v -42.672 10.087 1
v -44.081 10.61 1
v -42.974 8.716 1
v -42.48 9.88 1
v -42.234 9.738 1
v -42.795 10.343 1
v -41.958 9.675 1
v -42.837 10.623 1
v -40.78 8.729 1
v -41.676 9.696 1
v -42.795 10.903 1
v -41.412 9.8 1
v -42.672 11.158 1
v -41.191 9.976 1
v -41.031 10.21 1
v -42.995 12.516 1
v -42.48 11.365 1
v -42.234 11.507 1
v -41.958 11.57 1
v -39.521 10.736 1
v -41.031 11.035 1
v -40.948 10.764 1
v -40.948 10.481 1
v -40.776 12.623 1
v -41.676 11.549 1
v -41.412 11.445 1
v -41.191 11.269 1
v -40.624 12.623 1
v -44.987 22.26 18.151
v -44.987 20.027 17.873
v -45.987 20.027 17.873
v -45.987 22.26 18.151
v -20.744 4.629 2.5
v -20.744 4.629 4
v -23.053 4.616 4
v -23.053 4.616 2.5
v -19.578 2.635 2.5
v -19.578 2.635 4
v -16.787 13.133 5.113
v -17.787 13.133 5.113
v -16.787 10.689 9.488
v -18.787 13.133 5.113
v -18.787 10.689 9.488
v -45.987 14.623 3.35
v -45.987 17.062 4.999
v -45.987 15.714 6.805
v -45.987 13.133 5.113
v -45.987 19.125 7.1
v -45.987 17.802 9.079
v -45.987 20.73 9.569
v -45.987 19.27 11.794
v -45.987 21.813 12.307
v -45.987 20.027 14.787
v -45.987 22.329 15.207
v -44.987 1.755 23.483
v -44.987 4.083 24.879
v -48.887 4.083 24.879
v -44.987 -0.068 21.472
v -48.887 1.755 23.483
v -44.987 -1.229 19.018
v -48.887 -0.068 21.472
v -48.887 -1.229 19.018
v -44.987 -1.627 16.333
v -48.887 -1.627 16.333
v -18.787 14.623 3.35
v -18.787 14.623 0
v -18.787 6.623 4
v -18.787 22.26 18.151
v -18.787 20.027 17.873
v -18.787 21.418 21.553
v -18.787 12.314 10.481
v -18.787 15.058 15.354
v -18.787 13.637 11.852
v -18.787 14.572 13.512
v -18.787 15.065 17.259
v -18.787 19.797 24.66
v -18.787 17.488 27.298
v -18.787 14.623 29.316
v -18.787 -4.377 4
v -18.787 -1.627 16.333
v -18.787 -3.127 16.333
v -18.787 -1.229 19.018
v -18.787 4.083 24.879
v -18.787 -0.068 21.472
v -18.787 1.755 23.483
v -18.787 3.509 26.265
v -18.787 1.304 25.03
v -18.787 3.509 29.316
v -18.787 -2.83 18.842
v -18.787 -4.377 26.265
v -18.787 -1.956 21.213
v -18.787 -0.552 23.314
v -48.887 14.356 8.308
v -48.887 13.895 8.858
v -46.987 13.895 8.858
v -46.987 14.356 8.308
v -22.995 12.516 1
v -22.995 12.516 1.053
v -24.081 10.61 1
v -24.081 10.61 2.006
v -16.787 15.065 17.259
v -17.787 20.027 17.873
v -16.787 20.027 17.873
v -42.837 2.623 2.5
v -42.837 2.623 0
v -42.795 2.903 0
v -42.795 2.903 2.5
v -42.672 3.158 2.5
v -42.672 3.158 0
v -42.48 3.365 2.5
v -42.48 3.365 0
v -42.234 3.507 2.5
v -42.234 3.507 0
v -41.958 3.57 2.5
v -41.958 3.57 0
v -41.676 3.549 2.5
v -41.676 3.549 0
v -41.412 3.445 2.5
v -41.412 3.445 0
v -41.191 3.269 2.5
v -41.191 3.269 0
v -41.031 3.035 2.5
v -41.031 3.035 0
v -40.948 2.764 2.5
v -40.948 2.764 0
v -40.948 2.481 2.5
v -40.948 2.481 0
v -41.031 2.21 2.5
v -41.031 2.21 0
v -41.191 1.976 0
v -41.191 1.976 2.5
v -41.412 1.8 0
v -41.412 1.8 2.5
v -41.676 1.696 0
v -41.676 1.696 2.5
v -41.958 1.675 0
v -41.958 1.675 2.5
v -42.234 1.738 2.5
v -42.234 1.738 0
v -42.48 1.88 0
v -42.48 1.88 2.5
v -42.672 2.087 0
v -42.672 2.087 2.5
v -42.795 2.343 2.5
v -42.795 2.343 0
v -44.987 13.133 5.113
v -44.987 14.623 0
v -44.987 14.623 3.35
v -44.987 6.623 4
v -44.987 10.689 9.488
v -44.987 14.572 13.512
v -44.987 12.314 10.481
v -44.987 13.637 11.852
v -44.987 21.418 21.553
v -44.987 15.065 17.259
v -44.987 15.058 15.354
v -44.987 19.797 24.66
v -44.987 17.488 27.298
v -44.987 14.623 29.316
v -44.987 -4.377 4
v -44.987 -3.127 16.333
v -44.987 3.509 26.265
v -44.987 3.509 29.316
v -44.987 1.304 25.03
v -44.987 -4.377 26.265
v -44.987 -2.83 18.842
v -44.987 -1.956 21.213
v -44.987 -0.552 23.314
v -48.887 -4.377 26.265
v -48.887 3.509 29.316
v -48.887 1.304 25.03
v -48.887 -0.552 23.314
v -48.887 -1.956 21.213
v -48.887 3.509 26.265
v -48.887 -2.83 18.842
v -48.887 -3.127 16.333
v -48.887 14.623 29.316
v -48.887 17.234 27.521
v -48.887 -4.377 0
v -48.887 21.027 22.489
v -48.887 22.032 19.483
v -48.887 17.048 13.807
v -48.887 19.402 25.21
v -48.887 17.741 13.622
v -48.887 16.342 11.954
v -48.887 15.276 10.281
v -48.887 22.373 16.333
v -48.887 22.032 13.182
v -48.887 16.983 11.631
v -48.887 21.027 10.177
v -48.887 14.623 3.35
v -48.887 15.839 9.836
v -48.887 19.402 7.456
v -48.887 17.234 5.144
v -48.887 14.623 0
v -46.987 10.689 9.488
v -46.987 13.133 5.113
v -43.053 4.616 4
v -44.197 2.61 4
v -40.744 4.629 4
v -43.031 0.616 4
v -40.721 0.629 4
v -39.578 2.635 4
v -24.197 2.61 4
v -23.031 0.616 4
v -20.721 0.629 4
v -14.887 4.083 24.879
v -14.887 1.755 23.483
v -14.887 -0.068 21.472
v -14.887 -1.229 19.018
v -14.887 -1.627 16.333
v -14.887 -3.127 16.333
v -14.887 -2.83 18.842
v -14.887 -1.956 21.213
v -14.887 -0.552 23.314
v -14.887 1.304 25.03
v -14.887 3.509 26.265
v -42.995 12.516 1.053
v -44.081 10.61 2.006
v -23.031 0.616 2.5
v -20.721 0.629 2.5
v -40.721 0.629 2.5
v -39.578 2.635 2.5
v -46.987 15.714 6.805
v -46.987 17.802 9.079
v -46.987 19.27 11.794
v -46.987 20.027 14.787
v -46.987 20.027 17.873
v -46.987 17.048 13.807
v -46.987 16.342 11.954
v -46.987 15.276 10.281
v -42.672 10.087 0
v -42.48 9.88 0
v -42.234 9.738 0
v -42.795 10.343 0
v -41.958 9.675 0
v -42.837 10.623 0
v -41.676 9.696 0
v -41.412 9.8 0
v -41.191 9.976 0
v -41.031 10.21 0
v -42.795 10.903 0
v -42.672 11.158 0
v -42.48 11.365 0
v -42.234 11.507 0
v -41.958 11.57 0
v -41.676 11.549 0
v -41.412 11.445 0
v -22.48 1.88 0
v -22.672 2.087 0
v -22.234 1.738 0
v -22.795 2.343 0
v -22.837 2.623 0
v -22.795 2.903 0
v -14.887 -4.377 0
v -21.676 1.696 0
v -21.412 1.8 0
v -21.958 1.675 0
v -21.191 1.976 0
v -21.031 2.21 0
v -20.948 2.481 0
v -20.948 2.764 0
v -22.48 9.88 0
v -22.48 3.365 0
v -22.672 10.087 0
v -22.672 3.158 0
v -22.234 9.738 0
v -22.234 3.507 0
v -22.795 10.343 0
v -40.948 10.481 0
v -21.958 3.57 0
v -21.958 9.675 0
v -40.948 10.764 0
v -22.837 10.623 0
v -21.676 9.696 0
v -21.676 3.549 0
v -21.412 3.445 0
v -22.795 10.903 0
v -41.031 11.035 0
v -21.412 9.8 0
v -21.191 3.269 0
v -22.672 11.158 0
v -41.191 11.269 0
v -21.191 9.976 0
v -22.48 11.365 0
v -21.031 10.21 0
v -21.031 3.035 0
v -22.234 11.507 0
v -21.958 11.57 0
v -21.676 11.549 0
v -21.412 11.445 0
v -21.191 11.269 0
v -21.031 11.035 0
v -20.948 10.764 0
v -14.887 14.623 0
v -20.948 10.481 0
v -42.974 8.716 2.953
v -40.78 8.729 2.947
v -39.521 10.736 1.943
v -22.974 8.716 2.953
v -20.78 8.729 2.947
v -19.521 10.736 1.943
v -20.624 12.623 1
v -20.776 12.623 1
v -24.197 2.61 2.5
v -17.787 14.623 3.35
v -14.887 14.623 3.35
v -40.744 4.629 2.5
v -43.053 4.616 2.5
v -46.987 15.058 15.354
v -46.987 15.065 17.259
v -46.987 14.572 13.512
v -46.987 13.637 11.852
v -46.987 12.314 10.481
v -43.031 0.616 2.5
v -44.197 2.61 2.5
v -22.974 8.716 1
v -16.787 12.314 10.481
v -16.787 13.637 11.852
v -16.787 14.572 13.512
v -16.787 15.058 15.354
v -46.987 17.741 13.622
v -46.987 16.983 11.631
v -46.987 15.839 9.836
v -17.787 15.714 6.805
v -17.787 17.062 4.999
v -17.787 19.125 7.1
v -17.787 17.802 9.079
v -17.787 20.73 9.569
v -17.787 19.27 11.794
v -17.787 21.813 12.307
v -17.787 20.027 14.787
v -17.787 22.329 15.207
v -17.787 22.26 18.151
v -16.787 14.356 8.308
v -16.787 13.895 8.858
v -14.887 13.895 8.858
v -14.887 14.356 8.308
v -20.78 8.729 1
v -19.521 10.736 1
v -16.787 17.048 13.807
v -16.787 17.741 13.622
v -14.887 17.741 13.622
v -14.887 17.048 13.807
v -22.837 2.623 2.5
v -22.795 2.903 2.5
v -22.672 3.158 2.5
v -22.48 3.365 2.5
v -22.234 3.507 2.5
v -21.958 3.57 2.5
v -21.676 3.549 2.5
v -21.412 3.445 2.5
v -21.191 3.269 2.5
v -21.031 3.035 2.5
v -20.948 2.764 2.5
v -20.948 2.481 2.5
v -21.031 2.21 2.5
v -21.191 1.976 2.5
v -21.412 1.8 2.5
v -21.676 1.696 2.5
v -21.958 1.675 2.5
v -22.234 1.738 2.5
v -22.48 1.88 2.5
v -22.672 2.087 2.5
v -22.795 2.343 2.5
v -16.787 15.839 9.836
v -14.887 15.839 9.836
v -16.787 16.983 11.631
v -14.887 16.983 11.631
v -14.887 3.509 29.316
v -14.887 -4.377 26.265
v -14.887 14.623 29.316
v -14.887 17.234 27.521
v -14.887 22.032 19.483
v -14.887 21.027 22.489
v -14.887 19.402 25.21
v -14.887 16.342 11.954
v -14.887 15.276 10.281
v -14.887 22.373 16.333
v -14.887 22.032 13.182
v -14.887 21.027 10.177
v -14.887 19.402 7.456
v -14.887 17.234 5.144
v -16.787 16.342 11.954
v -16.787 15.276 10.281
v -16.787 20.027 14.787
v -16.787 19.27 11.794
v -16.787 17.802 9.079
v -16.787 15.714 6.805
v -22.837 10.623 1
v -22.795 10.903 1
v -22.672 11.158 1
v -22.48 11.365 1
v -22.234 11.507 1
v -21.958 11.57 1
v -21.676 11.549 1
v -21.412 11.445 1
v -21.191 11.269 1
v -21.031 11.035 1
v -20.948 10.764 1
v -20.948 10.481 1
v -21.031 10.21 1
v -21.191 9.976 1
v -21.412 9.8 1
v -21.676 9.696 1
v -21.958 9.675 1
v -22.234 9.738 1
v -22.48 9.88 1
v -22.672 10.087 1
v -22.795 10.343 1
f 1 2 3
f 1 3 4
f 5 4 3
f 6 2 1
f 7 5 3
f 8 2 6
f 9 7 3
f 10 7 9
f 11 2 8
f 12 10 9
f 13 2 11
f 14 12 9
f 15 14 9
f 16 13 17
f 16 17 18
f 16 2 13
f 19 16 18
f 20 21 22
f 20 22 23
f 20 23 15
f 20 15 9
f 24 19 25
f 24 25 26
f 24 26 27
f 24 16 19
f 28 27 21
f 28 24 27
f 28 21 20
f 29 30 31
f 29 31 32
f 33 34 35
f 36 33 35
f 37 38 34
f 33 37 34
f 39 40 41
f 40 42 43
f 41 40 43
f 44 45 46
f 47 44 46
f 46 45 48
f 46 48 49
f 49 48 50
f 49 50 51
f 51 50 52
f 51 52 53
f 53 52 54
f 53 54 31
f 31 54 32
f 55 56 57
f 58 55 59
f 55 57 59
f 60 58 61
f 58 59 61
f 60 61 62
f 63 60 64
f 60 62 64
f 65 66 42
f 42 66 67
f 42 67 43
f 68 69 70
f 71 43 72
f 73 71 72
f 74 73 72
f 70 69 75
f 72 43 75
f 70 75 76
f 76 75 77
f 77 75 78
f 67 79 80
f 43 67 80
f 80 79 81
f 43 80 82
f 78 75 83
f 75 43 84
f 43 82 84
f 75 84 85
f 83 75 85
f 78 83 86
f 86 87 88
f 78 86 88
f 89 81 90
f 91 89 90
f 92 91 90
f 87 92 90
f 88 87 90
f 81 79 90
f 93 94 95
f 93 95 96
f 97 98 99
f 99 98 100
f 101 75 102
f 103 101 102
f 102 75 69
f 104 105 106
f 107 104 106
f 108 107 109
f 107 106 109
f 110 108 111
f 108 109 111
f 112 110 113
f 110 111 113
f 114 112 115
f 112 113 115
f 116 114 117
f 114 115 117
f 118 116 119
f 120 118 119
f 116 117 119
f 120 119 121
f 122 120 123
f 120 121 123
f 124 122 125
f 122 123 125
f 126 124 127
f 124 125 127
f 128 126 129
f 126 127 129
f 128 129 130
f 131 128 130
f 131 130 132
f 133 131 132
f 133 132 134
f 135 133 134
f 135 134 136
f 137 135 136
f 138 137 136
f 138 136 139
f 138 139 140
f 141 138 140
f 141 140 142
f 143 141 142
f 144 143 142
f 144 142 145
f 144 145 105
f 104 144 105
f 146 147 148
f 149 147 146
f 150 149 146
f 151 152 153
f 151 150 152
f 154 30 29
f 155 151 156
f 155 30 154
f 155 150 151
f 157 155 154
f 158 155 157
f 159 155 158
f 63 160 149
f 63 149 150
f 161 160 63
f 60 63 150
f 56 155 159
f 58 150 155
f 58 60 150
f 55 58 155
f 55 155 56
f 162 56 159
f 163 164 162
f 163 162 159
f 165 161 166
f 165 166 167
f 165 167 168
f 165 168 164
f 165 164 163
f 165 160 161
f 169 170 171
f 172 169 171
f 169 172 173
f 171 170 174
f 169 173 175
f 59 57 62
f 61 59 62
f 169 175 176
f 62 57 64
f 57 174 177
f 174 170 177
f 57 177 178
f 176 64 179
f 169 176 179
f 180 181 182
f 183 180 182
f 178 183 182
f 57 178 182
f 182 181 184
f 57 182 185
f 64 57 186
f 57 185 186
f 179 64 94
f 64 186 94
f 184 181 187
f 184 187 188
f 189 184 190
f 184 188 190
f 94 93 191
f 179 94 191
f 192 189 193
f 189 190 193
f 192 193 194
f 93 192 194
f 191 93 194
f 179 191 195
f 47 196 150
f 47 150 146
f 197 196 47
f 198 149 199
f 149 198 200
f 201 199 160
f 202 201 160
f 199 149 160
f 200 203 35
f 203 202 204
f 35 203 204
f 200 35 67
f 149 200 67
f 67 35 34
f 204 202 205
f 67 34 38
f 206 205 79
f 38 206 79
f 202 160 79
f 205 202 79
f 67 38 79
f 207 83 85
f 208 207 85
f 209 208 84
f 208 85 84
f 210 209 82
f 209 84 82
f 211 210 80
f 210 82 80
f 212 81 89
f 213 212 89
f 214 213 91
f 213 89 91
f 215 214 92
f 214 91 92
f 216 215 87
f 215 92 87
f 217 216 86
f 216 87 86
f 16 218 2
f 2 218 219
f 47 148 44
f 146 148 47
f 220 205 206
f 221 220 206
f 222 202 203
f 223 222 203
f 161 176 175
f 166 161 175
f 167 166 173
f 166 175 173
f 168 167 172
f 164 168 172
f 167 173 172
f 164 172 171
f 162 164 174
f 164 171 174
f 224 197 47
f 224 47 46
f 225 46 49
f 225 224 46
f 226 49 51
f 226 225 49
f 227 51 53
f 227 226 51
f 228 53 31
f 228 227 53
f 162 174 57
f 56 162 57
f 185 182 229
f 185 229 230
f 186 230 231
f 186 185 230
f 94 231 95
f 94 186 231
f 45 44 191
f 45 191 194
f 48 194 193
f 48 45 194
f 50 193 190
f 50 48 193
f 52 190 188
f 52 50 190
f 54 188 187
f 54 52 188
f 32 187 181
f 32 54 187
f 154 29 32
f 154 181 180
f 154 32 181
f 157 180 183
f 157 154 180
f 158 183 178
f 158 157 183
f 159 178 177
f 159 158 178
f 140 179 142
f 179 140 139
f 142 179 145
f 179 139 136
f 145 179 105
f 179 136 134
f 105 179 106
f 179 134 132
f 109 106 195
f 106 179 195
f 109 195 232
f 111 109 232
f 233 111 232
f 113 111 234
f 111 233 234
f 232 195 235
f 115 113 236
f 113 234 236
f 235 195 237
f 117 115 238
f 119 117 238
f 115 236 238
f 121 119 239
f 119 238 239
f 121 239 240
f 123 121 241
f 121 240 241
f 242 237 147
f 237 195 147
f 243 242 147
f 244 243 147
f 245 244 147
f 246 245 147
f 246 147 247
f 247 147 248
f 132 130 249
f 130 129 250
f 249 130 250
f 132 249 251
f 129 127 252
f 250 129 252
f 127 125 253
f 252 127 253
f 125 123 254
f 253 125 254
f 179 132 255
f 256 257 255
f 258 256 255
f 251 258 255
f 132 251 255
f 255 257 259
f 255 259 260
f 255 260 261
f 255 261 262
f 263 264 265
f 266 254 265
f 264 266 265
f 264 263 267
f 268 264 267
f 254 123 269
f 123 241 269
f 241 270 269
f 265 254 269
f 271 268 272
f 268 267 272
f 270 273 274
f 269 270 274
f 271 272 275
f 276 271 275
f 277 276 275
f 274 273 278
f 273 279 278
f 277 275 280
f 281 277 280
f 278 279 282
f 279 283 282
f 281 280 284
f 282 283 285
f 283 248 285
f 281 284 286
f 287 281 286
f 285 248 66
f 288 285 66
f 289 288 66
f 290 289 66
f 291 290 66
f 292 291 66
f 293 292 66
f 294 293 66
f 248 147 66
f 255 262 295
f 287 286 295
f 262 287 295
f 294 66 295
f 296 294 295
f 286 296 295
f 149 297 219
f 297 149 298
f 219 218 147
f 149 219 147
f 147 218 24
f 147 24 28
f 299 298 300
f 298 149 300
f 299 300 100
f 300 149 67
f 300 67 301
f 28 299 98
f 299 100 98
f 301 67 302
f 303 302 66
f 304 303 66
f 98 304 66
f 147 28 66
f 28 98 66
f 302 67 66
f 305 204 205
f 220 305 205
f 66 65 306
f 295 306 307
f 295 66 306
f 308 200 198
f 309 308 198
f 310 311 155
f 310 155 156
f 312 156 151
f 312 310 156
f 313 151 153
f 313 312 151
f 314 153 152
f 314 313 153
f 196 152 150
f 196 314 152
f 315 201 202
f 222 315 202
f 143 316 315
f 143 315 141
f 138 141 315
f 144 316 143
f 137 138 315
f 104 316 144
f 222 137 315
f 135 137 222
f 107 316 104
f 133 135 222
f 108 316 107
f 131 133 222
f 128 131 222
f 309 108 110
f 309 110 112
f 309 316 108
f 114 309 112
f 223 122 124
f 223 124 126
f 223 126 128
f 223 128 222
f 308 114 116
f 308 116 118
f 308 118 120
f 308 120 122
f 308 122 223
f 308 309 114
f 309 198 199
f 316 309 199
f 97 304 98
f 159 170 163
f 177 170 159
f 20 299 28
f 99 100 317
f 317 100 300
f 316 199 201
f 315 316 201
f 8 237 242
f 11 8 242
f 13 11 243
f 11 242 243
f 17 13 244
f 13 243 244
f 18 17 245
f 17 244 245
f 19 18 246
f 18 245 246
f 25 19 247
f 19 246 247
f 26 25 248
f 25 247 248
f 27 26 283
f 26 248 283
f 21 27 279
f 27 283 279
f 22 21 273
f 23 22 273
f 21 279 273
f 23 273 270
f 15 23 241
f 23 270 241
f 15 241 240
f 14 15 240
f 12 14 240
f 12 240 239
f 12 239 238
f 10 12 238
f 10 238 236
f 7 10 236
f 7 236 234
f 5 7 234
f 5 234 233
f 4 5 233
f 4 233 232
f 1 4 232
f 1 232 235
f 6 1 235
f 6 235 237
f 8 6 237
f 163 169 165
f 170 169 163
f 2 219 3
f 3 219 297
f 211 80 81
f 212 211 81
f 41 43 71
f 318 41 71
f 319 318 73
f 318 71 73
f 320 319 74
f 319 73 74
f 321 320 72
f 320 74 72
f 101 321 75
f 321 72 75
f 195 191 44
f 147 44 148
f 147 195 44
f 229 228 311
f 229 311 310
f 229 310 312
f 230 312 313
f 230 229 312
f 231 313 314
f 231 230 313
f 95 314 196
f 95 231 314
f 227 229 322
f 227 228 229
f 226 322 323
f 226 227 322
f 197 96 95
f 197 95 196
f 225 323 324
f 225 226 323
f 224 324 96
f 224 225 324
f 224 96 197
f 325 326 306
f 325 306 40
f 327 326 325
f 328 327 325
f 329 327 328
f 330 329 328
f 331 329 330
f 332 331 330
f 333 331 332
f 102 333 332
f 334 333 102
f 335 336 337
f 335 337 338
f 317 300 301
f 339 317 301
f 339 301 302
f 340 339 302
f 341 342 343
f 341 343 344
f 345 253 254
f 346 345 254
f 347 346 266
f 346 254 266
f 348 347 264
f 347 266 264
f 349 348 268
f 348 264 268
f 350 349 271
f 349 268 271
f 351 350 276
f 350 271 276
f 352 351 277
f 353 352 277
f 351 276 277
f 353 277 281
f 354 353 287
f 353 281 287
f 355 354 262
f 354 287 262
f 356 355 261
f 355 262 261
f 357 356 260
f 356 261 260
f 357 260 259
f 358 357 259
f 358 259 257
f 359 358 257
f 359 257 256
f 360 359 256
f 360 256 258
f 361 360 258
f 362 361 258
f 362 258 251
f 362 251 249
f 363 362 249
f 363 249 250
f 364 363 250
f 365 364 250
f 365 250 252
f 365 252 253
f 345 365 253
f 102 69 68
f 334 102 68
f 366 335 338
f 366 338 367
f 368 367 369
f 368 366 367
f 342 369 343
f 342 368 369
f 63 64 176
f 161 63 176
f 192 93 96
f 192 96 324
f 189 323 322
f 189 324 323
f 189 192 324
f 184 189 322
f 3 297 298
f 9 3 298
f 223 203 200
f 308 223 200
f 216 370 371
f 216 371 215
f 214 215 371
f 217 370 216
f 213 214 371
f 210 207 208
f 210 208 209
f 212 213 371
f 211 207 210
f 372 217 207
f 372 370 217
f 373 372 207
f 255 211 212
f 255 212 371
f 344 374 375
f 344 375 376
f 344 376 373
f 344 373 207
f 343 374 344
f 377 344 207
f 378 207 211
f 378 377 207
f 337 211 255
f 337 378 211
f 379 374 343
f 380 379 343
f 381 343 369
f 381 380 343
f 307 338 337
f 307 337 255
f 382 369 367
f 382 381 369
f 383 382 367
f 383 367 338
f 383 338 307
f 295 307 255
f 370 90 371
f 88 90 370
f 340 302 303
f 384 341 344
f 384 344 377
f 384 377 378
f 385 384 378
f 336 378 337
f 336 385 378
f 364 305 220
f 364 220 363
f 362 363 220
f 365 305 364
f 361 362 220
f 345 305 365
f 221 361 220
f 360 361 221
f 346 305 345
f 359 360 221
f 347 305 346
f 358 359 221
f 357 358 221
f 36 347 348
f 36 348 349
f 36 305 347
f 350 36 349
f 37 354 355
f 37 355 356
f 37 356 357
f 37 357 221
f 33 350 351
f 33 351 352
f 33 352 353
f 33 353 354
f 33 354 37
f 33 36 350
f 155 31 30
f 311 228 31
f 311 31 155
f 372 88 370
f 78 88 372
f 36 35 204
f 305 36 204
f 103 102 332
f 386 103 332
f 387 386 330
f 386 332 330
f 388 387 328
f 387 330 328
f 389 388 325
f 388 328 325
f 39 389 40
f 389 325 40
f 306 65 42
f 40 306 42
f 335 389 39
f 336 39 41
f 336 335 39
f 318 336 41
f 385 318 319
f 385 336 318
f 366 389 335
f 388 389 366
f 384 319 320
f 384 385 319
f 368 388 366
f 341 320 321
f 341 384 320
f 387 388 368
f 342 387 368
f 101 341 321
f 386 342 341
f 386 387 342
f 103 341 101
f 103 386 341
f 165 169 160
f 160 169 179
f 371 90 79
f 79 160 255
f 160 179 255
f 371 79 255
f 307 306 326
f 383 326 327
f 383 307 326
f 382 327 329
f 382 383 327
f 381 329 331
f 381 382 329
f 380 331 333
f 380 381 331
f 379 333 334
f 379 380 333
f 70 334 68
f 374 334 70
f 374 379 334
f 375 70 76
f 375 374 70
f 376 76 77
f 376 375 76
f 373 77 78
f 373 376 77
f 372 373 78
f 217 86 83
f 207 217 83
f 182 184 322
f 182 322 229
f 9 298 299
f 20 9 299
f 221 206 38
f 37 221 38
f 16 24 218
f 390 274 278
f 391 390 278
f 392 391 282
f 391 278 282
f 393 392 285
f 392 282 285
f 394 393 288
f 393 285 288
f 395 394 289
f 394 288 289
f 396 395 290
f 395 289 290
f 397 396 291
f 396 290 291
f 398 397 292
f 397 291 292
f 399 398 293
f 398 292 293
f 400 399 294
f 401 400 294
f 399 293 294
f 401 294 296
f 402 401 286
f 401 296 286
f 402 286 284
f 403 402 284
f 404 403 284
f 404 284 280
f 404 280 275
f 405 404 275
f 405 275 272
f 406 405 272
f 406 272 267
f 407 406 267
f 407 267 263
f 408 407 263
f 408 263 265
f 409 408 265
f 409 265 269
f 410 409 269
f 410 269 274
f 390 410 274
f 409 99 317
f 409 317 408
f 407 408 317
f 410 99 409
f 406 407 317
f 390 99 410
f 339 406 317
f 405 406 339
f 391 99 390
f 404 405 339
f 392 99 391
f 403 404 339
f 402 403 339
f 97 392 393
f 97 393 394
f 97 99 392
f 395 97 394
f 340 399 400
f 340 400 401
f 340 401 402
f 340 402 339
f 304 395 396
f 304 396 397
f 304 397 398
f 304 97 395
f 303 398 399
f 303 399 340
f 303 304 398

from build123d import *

# Parameters (mm, degrees)
CROQUIS1_W              = 34
CROQUIS1_H              = 19
SALIENTE_EXTRUIR1_DEPTH = 35
CROQUIS2_W              = 26.2
CROQUIS2_H              = 31
CORTAR_EXTRUIR1_DEPTH   = 25
CORTAR_EXTRUIR3_DEPTH   = 26.2
SALIENTE_EXTRUIR2_DEPTH = 34
CROQUIS10_W             = 26.2
CROQUIS10_H             = 25.966324345
CORTAR_EXTRUIR4_DEPTH   = 10
CORTAR_EXTRUIR5_START   = -34
CORTAR_EXTRUIR5_DEPTH   = 34
CORTAR_EXTRUIR6_DEPTH   = 2
CORTAR_EXTRUIR7_START   = 28.2
CORTAR_EXTRUIR7_DEPTH   = 28.2
CORTAR_EXTRUIR8_DEPTH   = 1
CORTAR_EXTRUIR9_DEPTH   = 27.2
CORTAR_EXTRUIR10_START  = -34
CORTAR_EXTRUIR10_DEPTH  = 34
CROQUIS18_R             = 0.95
CORTAR_EXTRUIR11_DEPTH  = 4
CORTAR_EXTRUIR12_DEPTH  = 1.5
CORTAR_EXTRUIR13_DEPTH  = 3


with BuildPart() as part:
    # Croquis1 → Saliente-Extruir1 (new body)
    with BuildSketch(Plane.XY):
        with Locations((-31.887263086, 5.12254902)):
            Rectangle(CROQUIS1_W, CROQUIS1_H)
    extrude(amount=SALIENTE_EXTRUIR1_DEPTH)

    # Croquis2 → Cortar-Extruir1 (cut)
    with BuildSketch(Plane.XZ.offset(4.37745098)):
        with Locations((-31.887263086, 19.5)):
            Rectangle(CROQUIS2_W, CROQUIS2_H)
    extrude(amount=-CORTAR_EXTRUIR1_DEPTH, mode=Mode.SUBTRACT)

    # Croquis4 → Cortar-Extruir3 (cut)
    with BuildSketch(Plane.ZY.offset(18.787263086)):
        Polygon((4, 14.62254902), (4, 6.62254902), (0, 14.62254902), align=None)
    extrude(amount=CORTAR_EXTRUIR3_DEPTH, mode=Mode.SUBTRACT)

    # Croquis9 → Saliente-Extruir2 (add)
    with BuildSketch(Plane(origin=(-14.887263086, 0, 0), x_dir=(0, 0, -1), z_dir=(1, 0, 0))):
        with BuildLine():
            Line((-29.315831827, 14.62254902), (-3.349507482, 14.62254902))
            ThreePointArc((-3.349507482, 14.62254902), (-16.332669655, 22.37254902), (-29.315831827, 14.62254902))
        make_face()
    extrude(amount=-SALIENTE_EXTRUIR2_DEPTH)

    # Croquis10 → Cortar-Extruir4 (cut)
    with BuildSketch(Plane.XZ.offset(-14.62254902)):
        with Locations((-31.887263086, 16.332669655)):
            Rectangle(CROQUIS10_W, CROQUIS10_H)
    extrude(amount=-CORTAR_EXTRUIR4_DEPTH, mode=Mode.SUBTRACT)

    # Croquis11 → Cortar-Extruir5 (cut)
    with BuildSketch(Plane(origin=(-14.887263086, 0, 0), x_dir=(0, 0, -1), z_dir=(1, 0, 0)).offset(CORTAR_EXTRUIR5_START)):
        with BuildLine():
            Line((-26.264575199, 3.509186373), (-24.878727914, 4.083143951))
            ThreePointArc((-24.878727914, 4.083143951), (-21.471881808, -0.068419609), (-16.332669655, -1.62745098))
            Line((-16.332669655, -1.62745098), (-16.332669655, -3.12745098))
            ThreePointArc((-16.332669655, -3.12745098), (-22.305267563, -1.31560371), (-26.264575199, 3.509186373))
        make_face()
        with BuildLine():
            Line((-13.621540157, 17.74062205), (-13.807242822, 17.04757027))
            ThreePointArc((-13.807242822, 17.04757027), (-11.089968726, 15.851941052), (-8.857991001, 13.894549121))
            Line((-8.857991001, 13.894549121), (-8.308354113, 14.355749231))
            ThreePointArc((-8.308354113, 14.355749231), (-10.704456257, 16.457074414), (-13.621540157, 17.74062205))
        make_face()
    extrude(amount=CORTAR_EXTRUIR5_DEPTH, mode=Mode.SUBTRACT)

    # Croquis12 → Cortar-Extruir6 (cut)
    with BuildSketch(Plane.ZY.offset(18.787263086)):
        with BuildLine():
            Line((17.258889566, 15.065137056), (17.873210354, 20.027255157))
            ThreePointArc((17.873210354, 20.027255157), (10.39091869, 18.620075808), (5.112868034, 13.133089064))
            Line((5.112868034, 13.133089064), (9.488064371, 10.688715764))
            ThreePointArc((9.488064371, 10.688715764), (12.652304566, 14.157448622), (17.258889566, 15.065137056))
        make_face()
    extrude(amount=-CORTAR_EXTRUIR6_DEPTH, mode=Mode.SUBTRACT)

    # Croquis14 → Cortar-Extruir7 (cut)
    with BuildSketch(Plane.ZY.offset(18.787263086).offset(CORTAR_EXTRUIR7_START)):
        with BuildLine():
            Line((17.873210354, 20.027255157), (17.258889566, 15.065137056))
            ThreePointArc((17.258889566, 15.065137056), (12.652304566, 14.157448622), (9.488064371, 10.688715764))
            Line((9.488064371, 10.688715764), (5.112868034, 13.133089064))
            ThreePointArc((5.112868034, 13.133089064), (10.39091869, 18.620075808), (17.873210354, 20.027255157))
        make_face()
    extrude(amount=-CORTAR_EXTRUIR7_DEPTH, mode=Mode.SUBTRACT)

    # Croquis15 → Cortar-Extruir8 (cut)
    with BuildSketch(Plane.ZY.offset(18.787263086)):
        with BuildLine():
            Line((17.873210354, 20.027255157), (18.15050768, 22.260102262))
            ThreePointArc((18.15050768, 22.260102262), (9.568856329, 20.730307382), (3.349507482, 14.62254902))
            Line((3.349507482, 14.62254902), (5.112868034, 13.133089064))
            ThreePointArc((5.112868034, 13.133089064), (10.39091869, 18.620075808), (17.873210354, 20.027255157))
        make_face()
    extrude(amount=-CORTAR_EXTRUIR8_DEPTH, mode=Mode.SUBTRACT)

    # Croquis15<2> → Cortar-Extruir9 (cut)
    with BuildSketch(Plane.ZY.offset(18.787263086)):
        with BuildLine():
            Line((17.873210354, 20.027255157), (18.15050768, 22.260102262))
            ThreePointArc((18.15050768, 22.260102262), (9.568856329, 20.730307382), (3.349507482, 14.62254902))
            Line((3.349507482, 14.62254902), (5.112868034, 13.133089064))
            ThreePointArc((5.112868034, 13.133089064), (10.39091869, 18.620075808), (17.873210354, 20.027255157))
        make_face()
    extrude(amount=CORTAR_EXTRUIR9_DEPTH, mode=Mode.SUBTRACT)

    # Croquis17 → Cortar-Extruir10 (cut)
    with BuildSketch(Plane(origin=(-14.887263086, 0, 0), x_dir=(0, 0, -1), z_dir=(1, 0, 0)).offset(CORTAR_EXTRUIR10_START)):
        Polygon((-29.315831827, 3.509186373), (-29.315831827, 14.62254902), (-35, 14.62254902), (-35, -4.37745098), (-26.264575199, -4.37745098), align=None)
    extrude(amount=CORTAR_EXTRUIR10_DEPTH, mode=Mode.SUBTRACT)

    # Croquis18 → Cortar-Extruir11 (cut)
    with BuildSketch(Plane(origin=(0, 0, 0), x_dir=(-1, 0, 0), z_dir=(0, 0, -1))):
        with Locations((41.887263086, 2.62254902)):
            Circle(CROQUIS18_R)
        with Locations((21.887263086, 2.62254902)):
            Circle(CROQUIS18_R)
        with Locations((21.887263086, 10.62254902)):
            Circle(CROQUIS18_R)
        with Locations((41.887263086, 10.62254902)):
            Circle(CROQUIS18_R)
    extrude(amount=-CORTAR_EXTRUIR11_DEPTH, mode=Mode.SUBTRACT)

    # Croquis19 → Cortar-Extruir12 (cut)
    with BuildSketch(Plane.XY.offset(4)):
        Polygon((-43.030772734, 0.616129568), (-40.721407694, 0.629030888), (-39.577898045, 2.63545034), (-40.743753437, 4.628968471), (-43.053118477, 4.616067151), (-44.196628126, 2.609647699), align=None)
        Polygon((-23.030772734, 0.616129568), (-20.721407694, 0.629030888), (-19.577898045, 2.63545034), (-20.743753437, 4.628968471), (-23.053118477, 4.616067151), (-24.196628126, 2.609647699), align=None)
    extrude(amount=-CORTAR_EXTRUIR12_DEPTH, mode=Mode.SUBTRACT)

    # Croquis20 → Cortar-Extruir13 (cut)
    with BuildSketch(Plane.XY.offset(4)):
        Polygon((-44.081159874, 10.610292765), (-42.973597252, 8.71645054), (-40.779700463, 8.728706795), (-39.520722563, 10.735771313), (-40.628285185, 12.629613538), (-42.994825708, 12.516391244), align=None)
        Polygon((-24.081159874, 10.610292765), (-22.973597252, 8.71645054), (-20.779700463, 8.728706795), (-19.520722563, 10.735771313), (-20.628285185, 12.629613538), (-22.994825708, 12.516391244), align=None)
    extrude(amount=-CORTAR_EXTRUIR13_DEPTH, mode=Mode.SUBTRACT)


solid = part.part
